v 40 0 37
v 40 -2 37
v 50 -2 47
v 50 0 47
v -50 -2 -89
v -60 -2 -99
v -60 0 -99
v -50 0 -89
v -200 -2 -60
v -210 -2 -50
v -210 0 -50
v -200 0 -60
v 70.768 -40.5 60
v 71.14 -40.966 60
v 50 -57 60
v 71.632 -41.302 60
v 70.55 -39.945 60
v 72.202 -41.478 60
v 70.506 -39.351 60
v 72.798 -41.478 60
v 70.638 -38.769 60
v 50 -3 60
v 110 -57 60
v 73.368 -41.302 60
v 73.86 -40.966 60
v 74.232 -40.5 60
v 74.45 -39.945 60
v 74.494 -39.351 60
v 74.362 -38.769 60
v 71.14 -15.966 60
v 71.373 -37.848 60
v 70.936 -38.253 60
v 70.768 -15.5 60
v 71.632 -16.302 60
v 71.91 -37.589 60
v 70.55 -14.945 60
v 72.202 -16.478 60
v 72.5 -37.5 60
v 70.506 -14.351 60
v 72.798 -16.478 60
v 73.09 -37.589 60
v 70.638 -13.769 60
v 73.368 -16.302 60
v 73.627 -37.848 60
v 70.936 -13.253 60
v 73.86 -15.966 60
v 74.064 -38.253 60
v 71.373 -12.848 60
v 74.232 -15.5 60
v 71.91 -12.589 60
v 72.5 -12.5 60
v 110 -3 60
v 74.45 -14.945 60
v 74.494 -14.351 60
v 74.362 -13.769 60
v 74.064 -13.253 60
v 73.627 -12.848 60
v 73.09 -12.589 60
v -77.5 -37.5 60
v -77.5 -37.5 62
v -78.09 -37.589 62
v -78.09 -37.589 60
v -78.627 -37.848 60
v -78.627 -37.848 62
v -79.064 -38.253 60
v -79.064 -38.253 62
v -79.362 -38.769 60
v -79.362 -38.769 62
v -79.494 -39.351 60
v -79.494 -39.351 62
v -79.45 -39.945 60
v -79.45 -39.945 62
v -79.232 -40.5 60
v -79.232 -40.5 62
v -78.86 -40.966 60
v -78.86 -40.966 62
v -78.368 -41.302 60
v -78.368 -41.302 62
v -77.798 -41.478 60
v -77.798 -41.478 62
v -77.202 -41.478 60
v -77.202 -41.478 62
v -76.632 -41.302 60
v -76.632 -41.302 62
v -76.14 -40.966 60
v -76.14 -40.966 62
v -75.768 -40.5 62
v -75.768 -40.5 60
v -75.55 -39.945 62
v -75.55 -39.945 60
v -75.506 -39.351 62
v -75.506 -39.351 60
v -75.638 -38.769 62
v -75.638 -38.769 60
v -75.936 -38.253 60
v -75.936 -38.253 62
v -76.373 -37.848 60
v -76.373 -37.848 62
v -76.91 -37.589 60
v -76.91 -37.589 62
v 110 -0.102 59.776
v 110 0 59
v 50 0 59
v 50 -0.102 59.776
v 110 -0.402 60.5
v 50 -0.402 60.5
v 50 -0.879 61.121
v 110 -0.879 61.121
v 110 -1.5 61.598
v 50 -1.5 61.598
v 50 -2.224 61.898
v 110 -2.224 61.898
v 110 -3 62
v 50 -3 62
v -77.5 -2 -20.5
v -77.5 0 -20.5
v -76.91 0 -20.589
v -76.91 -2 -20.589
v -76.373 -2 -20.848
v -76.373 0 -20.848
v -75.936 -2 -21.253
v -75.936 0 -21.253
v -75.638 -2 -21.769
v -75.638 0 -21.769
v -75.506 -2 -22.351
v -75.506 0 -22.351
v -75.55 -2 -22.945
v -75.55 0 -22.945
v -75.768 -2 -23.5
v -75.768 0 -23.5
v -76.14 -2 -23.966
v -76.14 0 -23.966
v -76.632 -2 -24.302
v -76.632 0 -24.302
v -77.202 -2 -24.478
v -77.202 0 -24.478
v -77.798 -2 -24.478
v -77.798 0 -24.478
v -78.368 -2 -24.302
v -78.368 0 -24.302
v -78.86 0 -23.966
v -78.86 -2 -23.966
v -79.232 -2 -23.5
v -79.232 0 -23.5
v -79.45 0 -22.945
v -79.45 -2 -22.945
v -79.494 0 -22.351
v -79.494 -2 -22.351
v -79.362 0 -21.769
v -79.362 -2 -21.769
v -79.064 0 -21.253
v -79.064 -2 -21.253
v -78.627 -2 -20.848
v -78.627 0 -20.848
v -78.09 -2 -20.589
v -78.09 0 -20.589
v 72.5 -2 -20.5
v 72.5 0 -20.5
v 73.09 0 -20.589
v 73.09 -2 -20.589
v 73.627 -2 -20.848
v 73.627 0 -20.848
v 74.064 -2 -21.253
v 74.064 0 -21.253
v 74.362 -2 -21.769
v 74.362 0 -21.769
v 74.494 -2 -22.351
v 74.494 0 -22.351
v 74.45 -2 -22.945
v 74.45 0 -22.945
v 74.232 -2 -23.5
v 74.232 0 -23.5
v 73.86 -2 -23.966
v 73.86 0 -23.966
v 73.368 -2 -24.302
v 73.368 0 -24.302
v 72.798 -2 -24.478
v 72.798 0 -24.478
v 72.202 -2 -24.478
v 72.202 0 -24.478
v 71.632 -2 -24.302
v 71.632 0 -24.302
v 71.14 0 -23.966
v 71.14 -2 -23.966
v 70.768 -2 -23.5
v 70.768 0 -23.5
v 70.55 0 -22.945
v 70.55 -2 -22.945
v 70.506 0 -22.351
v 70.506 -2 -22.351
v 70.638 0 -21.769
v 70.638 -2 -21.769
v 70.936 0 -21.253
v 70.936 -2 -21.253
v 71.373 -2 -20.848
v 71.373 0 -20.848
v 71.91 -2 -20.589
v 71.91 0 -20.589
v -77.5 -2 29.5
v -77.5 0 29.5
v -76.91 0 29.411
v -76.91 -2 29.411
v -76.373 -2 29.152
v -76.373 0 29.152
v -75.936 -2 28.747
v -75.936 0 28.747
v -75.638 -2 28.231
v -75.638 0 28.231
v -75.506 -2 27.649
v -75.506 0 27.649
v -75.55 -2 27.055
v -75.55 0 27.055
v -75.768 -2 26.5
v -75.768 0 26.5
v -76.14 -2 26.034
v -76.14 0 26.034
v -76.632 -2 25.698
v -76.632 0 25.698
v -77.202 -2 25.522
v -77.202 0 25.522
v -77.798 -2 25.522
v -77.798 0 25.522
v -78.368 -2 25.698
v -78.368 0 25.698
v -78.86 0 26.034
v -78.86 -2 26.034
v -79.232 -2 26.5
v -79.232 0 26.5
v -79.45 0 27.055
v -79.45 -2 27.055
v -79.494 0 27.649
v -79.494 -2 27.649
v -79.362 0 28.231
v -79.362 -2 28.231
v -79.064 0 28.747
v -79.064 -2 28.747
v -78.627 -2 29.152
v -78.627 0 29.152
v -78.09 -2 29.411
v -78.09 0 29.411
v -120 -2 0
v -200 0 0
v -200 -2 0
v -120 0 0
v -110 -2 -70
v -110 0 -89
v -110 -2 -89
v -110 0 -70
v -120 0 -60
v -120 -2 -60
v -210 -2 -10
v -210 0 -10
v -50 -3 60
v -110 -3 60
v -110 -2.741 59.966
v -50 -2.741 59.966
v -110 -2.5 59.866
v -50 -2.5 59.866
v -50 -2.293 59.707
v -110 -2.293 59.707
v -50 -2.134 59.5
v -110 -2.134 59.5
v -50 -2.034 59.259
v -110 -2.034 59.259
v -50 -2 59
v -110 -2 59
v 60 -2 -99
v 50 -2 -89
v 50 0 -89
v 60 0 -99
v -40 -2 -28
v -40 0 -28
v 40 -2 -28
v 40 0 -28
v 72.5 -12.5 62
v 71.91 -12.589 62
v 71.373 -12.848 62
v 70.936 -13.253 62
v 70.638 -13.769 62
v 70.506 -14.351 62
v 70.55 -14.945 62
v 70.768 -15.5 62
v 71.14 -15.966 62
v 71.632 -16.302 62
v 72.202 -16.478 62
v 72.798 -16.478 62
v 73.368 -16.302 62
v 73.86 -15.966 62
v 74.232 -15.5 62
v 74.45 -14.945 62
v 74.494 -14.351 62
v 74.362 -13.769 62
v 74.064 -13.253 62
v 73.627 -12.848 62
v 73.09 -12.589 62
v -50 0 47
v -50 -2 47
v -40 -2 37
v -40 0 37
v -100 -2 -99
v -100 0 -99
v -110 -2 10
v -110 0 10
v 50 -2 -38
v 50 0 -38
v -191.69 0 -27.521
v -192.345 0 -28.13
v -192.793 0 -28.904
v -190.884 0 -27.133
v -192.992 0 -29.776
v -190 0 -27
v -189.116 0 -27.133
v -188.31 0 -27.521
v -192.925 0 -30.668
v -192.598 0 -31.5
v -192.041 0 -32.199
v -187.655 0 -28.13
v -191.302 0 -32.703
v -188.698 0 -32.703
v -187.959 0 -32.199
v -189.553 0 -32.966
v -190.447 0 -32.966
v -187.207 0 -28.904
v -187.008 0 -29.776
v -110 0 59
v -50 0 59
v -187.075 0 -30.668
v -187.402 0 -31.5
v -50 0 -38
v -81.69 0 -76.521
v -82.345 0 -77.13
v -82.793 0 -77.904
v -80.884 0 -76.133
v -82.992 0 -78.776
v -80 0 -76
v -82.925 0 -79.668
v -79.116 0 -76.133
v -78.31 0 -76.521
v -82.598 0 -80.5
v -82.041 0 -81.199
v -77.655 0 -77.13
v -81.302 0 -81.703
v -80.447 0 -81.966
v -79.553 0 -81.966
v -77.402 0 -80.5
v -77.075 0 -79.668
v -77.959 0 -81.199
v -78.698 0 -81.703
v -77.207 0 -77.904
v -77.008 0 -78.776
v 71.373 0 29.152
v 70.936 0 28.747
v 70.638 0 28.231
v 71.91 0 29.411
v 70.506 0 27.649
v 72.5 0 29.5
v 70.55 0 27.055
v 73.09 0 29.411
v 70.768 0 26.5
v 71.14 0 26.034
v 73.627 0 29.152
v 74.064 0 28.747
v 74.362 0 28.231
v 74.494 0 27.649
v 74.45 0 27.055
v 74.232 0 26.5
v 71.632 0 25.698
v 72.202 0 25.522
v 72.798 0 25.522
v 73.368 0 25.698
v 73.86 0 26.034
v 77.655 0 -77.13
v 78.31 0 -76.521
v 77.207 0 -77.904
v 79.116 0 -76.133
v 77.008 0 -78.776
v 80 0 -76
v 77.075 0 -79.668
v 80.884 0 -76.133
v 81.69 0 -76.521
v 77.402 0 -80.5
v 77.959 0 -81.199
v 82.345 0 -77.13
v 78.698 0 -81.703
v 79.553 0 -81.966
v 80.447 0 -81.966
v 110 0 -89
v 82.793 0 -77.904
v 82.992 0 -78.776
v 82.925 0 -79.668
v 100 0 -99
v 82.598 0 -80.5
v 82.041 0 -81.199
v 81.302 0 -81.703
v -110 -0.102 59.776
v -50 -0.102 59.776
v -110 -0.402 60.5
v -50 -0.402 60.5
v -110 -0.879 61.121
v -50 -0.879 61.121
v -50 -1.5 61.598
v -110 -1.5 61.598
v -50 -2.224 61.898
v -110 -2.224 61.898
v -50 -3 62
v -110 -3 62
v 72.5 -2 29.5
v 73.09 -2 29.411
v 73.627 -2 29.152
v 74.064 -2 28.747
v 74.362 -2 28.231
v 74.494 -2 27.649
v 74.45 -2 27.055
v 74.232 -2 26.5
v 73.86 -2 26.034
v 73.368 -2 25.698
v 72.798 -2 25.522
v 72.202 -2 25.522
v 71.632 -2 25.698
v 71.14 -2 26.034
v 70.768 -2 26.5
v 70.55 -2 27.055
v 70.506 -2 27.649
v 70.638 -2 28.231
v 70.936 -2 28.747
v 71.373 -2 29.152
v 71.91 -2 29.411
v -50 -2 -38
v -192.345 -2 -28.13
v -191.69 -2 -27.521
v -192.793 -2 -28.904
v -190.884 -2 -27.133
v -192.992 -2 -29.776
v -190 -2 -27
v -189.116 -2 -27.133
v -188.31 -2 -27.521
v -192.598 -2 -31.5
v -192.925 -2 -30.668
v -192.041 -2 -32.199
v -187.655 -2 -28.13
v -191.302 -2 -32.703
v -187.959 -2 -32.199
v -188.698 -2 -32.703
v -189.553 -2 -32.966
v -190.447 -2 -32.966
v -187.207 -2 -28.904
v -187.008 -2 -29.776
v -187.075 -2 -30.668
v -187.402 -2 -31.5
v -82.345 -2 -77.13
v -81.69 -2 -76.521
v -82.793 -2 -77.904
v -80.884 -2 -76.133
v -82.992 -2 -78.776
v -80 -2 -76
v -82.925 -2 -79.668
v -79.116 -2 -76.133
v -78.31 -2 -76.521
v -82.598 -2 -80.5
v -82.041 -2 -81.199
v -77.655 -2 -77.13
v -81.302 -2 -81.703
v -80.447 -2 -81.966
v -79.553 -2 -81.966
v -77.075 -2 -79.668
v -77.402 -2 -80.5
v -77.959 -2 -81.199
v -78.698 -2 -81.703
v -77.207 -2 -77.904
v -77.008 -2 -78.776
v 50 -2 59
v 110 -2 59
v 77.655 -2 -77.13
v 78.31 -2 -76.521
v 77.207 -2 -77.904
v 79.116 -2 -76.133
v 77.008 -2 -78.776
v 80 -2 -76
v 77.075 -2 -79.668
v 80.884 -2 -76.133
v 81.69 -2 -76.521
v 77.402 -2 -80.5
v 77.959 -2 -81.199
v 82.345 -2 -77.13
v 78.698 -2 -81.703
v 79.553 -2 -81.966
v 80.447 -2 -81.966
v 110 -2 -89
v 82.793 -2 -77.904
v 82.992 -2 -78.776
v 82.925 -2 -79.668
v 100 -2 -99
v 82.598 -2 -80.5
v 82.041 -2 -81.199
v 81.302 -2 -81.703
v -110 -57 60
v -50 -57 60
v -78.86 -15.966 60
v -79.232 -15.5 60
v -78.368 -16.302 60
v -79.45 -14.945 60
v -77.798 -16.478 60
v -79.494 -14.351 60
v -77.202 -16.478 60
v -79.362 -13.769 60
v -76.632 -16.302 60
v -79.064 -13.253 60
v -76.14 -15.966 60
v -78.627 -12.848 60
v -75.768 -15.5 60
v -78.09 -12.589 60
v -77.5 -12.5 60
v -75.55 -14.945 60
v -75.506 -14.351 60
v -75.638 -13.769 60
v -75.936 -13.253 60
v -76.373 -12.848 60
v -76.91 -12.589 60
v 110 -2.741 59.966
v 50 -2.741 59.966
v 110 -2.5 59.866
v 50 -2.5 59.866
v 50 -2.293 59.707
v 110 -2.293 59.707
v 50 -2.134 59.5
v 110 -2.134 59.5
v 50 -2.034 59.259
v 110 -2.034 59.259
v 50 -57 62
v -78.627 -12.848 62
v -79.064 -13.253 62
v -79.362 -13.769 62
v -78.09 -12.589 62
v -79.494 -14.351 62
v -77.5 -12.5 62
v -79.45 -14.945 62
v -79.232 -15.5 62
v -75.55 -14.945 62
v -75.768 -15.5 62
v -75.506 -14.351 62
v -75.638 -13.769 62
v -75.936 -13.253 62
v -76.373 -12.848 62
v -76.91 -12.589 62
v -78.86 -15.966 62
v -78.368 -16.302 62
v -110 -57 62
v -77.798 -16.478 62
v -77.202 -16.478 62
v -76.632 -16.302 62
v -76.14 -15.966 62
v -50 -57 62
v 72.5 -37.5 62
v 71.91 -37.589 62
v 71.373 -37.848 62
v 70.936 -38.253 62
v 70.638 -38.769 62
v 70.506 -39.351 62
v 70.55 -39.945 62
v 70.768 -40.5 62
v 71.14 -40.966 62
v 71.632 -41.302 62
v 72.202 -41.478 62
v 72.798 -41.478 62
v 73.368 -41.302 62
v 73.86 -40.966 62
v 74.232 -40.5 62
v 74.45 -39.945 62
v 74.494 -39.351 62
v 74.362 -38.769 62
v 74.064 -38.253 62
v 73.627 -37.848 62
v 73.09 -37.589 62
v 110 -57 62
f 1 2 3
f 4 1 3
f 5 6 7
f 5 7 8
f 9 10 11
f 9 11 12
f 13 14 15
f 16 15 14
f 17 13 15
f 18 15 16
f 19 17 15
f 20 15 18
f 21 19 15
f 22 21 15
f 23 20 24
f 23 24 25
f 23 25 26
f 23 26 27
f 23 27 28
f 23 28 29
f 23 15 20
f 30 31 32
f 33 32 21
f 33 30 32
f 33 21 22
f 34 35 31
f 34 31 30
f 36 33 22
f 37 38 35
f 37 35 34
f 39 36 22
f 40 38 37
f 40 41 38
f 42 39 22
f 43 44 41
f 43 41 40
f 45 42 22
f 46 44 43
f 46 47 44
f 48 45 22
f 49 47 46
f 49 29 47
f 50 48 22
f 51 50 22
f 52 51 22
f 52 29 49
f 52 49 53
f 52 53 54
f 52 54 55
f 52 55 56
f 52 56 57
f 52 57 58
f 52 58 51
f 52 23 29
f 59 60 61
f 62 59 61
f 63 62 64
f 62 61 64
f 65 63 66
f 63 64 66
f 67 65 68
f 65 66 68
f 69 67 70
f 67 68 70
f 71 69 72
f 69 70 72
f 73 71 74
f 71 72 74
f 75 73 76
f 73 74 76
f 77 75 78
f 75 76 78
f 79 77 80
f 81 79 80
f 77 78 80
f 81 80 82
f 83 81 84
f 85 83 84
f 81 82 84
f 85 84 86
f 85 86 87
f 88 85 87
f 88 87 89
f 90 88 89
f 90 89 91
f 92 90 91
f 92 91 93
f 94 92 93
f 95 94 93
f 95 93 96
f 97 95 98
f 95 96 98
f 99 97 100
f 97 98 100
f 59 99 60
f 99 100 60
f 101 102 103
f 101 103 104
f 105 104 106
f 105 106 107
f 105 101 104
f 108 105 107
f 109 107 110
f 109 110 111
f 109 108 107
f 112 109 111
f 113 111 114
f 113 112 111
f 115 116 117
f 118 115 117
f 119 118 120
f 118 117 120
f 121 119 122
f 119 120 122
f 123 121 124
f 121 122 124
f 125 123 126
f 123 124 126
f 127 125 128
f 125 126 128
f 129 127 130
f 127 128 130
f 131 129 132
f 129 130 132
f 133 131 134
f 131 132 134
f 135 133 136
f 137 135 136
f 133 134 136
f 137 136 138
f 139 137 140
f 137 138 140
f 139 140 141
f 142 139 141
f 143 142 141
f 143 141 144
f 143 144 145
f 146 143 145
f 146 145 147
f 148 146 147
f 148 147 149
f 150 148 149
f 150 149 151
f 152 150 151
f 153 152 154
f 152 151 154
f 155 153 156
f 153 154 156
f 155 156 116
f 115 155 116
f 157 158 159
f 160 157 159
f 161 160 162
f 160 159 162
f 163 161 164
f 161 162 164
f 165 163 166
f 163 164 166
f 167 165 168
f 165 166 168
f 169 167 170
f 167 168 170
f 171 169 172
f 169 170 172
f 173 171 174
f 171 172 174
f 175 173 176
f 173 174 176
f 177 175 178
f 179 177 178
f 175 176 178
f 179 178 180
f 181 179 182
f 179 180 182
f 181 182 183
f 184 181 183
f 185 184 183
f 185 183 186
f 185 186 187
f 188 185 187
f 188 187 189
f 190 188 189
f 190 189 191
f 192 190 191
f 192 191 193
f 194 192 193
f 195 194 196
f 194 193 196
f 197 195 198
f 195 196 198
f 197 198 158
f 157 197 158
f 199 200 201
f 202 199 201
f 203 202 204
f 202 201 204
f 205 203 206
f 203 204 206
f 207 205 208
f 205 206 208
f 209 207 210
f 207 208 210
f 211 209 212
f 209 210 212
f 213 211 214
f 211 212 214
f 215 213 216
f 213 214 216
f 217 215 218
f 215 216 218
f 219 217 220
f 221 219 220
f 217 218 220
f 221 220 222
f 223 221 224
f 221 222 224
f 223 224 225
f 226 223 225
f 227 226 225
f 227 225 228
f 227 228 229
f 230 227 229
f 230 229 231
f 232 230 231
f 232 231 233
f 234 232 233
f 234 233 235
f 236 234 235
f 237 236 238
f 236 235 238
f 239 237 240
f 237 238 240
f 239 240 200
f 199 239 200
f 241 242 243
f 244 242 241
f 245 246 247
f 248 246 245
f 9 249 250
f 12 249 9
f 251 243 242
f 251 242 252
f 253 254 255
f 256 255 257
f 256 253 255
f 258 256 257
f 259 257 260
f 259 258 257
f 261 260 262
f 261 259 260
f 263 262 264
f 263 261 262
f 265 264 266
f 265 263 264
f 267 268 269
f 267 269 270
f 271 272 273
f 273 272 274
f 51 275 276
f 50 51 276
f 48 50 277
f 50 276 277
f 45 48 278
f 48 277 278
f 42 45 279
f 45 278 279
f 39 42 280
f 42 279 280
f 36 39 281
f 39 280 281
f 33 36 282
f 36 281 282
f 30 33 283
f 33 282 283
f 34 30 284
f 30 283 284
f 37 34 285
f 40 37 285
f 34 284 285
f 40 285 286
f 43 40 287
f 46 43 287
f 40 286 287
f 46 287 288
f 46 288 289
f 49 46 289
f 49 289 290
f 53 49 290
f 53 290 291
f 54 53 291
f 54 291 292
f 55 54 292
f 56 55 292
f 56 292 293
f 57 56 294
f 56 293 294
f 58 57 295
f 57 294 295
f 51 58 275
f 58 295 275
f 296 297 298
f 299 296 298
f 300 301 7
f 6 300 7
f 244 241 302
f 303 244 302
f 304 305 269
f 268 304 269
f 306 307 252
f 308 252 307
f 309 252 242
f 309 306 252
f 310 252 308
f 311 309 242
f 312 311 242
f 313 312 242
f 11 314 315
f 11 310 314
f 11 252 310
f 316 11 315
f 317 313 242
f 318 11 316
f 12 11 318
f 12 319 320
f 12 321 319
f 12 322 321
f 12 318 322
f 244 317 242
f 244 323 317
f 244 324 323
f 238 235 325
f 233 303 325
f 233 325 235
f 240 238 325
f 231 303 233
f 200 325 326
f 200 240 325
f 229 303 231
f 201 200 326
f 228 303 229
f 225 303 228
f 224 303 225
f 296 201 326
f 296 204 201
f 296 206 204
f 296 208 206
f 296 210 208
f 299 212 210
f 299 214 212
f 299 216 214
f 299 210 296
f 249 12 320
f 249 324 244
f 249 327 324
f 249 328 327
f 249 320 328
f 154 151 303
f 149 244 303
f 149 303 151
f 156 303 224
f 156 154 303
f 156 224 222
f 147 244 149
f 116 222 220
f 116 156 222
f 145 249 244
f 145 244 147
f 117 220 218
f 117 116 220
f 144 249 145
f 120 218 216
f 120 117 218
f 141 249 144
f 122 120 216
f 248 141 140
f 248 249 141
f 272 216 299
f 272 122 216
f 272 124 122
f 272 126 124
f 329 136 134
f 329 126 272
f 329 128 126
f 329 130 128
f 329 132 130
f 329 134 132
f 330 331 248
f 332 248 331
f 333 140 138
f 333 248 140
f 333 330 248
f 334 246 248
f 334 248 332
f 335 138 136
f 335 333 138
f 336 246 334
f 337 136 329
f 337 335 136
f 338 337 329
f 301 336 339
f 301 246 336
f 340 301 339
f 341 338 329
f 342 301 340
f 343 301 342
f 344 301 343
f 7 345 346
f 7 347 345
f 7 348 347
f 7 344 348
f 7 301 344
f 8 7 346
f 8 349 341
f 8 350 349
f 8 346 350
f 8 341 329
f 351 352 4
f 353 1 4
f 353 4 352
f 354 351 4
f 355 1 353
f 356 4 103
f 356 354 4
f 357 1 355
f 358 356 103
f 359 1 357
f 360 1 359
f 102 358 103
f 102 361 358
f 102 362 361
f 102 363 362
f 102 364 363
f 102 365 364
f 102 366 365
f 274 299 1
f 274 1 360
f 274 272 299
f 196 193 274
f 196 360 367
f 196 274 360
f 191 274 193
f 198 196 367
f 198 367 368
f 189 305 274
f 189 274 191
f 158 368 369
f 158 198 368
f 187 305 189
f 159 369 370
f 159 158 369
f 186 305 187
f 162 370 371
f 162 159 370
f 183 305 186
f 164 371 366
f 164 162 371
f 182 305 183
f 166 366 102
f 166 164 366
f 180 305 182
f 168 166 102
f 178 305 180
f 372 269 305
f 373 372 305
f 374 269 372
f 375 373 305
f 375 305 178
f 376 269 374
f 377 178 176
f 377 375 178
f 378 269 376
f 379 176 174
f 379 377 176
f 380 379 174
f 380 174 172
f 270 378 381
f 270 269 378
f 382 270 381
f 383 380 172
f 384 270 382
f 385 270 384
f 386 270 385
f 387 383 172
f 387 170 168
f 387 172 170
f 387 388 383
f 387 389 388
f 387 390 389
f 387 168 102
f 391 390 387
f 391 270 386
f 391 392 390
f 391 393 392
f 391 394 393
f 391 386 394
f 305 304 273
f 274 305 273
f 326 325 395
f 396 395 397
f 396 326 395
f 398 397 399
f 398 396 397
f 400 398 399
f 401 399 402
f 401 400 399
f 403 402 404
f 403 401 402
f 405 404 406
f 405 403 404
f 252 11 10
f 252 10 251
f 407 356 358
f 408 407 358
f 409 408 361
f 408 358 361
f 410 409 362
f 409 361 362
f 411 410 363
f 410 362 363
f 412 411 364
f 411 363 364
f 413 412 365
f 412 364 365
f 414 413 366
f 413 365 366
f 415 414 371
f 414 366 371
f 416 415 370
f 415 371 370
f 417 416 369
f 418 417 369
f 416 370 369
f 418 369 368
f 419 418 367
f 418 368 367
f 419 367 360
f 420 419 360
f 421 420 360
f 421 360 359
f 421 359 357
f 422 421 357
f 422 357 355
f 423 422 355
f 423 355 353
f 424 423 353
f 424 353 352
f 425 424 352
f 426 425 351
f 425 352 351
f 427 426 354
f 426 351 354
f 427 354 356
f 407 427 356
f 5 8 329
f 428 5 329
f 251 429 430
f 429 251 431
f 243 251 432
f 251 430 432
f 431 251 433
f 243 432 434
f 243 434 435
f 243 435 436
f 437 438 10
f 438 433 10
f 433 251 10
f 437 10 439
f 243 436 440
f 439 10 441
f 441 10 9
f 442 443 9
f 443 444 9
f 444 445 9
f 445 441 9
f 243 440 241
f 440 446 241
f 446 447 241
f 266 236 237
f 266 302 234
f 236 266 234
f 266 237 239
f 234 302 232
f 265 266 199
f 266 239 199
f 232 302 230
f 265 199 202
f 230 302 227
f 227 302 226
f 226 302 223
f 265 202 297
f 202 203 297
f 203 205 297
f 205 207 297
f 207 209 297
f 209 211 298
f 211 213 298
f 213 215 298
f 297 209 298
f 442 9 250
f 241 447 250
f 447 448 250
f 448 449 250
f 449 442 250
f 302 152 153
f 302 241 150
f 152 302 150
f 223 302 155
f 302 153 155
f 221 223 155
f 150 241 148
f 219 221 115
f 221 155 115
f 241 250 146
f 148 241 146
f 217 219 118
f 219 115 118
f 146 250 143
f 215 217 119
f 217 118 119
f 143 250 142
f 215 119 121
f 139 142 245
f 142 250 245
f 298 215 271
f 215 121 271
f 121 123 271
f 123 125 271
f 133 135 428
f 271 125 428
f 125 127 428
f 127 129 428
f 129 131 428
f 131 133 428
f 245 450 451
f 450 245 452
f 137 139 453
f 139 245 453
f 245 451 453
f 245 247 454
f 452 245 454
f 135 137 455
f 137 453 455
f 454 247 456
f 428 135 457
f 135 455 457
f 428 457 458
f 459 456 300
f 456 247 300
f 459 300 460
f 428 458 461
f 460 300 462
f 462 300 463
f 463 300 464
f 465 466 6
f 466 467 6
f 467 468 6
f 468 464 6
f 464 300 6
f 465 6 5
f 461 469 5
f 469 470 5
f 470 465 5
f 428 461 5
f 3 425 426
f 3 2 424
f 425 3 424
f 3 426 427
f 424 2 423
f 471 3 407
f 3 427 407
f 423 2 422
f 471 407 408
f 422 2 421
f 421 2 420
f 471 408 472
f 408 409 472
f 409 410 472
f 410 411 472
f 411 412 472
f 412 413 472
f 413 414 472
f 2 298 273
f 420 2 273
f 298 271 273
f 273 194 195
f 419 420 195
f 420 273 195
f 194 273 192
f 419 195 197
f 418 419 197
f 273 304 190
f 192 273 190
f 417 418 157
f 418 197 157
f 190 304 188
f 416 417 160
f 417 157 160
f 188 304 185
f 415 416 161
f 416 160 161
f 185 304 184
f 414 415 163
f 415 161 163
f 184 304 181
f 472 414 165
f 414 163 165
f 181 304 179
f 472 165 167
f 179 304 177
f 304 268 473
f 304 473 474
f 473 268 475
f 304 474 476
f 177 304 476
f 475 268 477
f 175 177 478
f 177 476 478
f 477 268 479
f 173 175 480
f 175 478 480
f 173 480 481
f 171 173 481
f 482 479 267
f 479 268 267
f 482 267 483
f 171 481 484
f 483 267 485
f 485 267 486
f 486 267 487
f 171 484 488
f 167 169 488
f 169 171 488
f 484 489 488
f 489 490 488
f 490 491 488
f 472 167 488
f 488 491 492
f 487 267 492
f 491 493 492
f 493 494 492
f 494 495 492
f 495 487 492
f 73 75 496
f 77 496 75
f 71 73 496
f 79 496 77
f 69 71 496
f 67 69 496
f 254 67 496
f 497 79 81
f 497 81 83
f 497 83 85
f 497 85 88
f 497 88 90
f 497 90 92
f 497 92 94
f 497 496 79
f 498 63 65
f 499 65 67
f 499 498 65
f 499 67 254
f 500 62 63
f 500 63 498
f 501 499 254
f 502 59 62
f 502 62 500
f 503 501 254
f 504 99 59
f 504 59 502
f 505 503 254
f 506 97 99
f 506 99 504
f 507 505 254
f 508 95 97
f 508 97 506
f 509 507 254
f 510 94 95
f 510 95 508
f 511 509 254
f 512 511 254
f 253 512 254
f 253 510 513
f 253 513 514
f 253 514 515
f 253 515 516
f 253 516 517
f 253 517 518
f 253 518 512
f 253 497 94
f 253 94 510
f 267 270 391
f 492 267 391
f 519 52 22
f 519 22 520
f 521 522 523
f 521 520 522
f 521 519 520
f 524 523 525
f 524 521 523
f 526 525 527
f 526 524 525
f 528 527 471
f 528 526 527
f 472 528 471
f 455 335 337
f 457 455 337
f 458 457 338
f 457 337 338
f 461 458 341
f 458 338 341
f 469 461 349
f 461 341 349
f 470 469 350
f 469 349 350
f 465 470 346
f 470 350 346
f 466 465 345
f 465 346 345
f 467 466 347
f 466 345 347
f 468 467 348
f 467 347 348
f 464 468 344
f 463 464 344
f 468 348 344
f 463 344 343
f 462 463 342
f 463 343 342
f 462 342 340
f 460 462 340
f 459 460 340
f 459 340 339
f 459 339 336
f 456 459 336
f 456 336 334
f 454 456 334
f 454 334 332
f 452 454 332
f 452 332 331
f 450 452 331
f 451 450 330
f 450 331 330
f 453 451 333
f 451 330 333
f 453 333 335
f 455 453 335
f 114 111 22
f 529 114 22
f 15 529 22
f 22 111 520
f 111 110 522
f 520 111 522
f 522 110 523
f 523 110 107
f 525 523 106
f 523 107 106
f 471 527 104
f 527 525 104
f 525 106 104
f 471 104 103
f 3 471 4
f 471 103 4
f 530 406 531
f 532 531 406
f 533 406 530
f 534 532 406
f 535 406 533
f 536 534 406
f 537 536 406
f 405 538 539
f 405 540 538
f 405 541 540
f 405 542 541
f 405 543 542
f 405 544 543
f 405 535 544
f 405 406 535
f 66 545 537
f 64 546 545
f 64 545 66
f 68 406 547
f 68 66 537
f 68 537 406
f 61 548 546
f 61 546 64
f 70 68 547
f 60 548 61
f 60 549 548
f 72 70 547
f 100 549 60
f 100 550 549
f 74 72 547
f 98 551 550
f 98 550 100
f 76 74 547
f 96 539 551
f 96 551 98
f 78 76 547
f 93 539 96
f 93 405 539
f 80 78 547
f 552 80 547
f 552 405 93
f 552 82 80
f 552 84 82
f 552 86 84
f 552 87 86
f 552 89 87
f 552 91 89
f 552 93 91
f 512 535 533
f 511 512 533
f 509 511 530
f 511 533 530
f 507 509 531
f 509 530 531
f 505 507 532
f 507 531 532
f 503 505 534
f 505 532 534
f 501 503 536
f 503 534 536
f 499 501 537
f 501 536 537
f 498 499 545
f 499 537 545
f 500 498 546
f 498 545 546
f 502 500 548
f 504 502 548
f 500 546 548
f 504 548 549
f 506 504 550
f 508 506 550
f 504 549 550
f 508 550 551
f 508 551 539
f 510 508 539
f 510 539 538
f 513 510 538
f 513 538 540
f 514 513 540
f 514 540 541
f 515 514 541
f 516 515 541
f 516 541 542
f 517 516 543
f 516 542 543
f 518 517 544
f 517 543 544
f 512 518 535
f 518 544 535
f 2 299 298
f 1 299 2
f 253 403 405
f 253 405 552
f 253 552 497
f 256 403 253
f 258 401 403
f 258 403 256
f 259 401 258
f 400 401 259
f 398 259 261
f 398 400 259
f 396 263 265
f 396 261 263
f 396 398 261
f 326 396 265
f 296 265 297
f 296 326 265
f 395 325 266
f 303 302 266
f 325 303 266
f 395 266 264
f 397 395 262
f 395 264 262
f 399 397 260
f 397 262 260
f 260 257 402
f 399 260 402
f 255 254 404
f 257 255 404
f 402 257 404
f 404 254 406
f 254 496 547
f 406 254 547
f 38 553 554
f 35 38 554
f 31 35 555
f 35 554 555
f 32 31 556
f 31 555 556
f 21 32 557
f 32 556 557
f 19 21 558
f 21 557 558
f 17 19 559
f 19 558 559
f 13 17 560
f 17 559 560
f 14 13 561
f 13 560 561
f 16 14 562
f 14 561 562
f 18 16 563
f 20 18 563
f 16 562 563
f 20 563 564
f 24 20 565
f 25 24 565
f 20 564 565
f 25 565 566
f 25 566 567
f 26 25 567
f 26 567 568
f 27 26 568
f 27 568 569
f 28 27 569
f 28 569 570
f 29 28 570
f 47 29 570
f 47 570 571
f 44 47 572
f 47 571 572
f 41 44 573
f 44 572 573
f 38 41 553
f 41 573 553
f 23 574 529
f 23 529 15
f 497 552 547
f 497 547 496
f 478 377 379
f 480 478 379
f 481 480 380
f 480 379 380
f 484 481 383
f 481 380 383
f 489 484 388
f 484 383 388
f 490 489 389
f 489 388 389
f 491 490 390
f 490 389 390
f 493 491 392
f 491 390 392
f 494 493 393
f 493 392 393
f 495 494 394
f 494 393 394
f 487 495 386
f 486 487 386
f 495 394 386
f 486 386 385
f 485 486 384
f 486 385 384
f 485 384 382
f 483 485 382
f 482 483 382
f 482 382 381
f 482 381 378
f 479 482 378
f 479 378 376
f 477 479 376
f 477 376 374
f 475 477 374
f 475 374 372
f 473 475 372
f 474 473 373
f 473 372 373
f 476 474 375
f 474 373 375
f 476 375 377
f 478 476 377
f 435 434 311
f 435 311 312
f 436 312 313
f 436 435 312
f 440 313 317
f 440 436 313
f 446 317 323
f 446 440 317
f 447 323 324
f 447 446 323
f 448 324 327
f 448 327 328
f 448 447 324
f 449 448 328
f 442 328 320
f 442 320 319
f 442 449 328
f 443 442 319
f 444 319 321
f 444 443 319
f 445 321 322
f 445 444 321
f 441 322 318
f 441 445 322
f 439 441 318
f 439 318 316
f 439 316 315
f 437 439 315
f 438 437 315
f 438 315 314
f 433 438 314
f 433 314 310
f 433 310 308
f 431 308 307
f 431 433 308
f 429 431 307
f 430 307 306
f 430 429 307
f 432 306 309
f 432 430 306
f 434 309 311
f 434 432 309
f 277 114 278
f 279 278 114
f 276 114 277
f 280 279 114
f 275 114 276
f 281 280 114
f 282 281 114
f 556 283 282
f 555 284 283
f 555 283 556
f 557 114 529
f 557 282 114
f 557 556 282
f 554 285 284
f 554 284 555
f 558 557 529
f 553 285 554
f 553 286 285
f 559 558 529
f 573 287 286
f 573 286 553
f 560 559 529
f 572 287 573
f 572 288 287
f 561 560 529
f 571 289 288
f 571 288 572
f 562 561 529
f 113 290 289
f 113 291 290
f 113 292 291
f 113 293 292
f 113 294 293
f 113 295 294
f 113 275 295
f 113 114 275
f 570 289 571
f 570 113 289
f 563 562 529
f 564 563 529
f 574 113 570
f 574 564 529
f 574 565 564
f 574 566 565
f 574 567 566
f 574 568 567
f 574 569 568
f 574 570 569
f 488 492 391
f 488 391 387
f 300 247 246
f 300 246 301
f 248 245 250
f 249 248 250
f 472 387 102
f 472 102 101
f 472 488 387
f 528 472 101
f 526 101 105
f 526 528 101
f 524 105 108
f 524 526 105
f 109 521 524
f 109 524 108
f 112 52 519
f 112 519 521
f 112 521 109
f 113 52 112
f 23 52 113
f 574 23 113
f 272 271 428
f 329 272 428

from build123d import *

# Parameters (mm, degrees)
SM_BASE_FLANGE_1_DEPTH            = 2
SM_EDGE_FLANGE_2_STRIP_W          = 10
SM_EDGE_FLANGE_2_STRIP_H          = 2
SM_EDGE_FLANGE_2_STRIP_CUT_DEPTH  = 220
SM_EDGE_FLANGE_2_RELIEF_W         = 11
SM_EDGE_FLANGE_2_RELIEF_H         = 1
SM_EDGE_FLANGE_2_RELIEF_CUT_DEPTH = 2
SM_EDGE_FLANGE_2_DEPTH            = 220
CUT_EXTRUDE_START                 = 62
SKETCH_12_R                       = 2
CUT_EXTRUDE_4_DEPTH               = 2
SKETCH_14_R                       = 2
CUT_EXTRUDE_2_DEPTH               = 2
SKETCH_15_W                       = 100
SKETCH_15_H                       = 25
CUT_EXTRUDE_3_DEPTH               = 57
SKETCH_16_W                       = 100
SKETCH_16_H                       = 60
CUT_EXTRUDE_6_DEPTH               = 2
CUT_EXTRUDE_START_2               = -2
SKETCH_18_R                       = 3
CUT_EXTRUDE_7_DEPTH               = 2
OTHER_START                       = -2
OTHER_2_DEPTH                     = 2
SKETCH_20_W                       = 60
SKETCH_20_H                       = 61
CUT_EXTRUDE_8_DEPTH               = 2
SKETCH_21_R                       = 3
CUT_EXTRUDE_9_DEPTH               = 2
OTHER_4_DEPTH                     = 2
OTHER_4_2_DEPTH                   = 2


# Read off the part's stored shape, not the designer's step: 断开-边角2, 断开-边角4
# Sheet-metal steps are written as plain solids
with BuildPart() as part:
    # Sketch 1 → 基体-法兰1 (new body)
    with BuildSketch(Plane(origin=(0, 0, 0), x_dir=(1, 0, 0), z_dir=(0, 1, 0))):
        Polygon((-110, -60), (110, -60), (110, 60), (110, 160), (-110, 160), (-110, 60), (-210, 60), (-210, -60), align=None)
    extrude(amount=-SM_BASE_FLANGE_1_DEPTH)

    # 边线-法兰2 strip (across the edge) → 边线-法兰2 strip cut (cut)
    with BuildSketch(Plane(origin=(110, -2, 60), x_dir=(0, 0, -1), z_dir=(-1, 0, 0))):
        with Locations((-4, -1)):
            Rectangle(SM_EDGE_FLANGE_2_STRIP_W, SM_EDGE_FLANGE_2_STRIP_H)
    extrude(amount=SM_EDGE_FLANGE_2_STRIP_CUT_DEPTH, mode=Mode.SUBTRACT)

    # 边线-法兰2 relief (on the sheet) → 边线-法兰2 relief cut (cut)
    with BuildSketch(Plane(origin=(110, -2, 59), x_dir=(0, 0, -1), z_dir=(0, -1, 0))):
        with Locations((-4.5, -220.5)):
            Rectangle(SM_EDGE_FLANGE_2_RELIEF_W, SM_EDGE_FLANGE_2_RELIEF_H)
    extrude(amount=-SM_EDGE_FLANGE_2_RELIEF_CUT_DEPTH, mode=Mode.SUBTRACT)

    # 边线-法兰2 section (across the edge) → 边线-法兰2 (add)
    with BuildSketch(Plane(origin=(110, -2, 60), x_dir=(0, 0, -1), z_dir=(-1, 0, 0))):
        with BuildLine():
            Line((-2, 1), (-2, 55))
            Line((-2, 55), (0, 55))
            Line((0, 55), (0, 1))
            ThreePointArc((0, 1), (0.292893219, 0.292893219), (1, 0))
            Line((1, 0), (1, -2))
            ThreePointArc((1, -2), (-1.121320344, -1.121320344), (-2, 1))
        make_face()
    extrude(amount=SM_EDGE_FLANGE_2_DEPTH)

    # 草图12 → 切除-拉伸4 (cut)
    with BuildSketch(Plane.XY.offset(CUT_EXTRUDE_START)):
        with Locations(Location((72.5, -14.5, 0), (0, 0, 90))):
            Circle(SKETCH_12_R)
        with Locations(Location((-77.5, -14.5, 0), (0, 0, 90))):
            Circle(SKETCH_12_R)
        with Locations(Location((-77.5, -39.5, 0), (0, 0, 90))):
            Circle(SKETCH_12_R)
        with Locations(Location((72.5, -39.5, 0), (0, 0, 90))):
            Circle(SKETCH_12_R)
    extrude(amount=-CUT_EXTRUDE_4_DEPTH, mode=Mode.SUBTRACT)

    # 草图14 → 切除-拉伸2 (cut)
    with BuildSketch(Plane(origin=(0, 0, 0), x_dir=(1, 0, 0), z_dir=(0, 1, 0))):
        with Locations(Location((-77.5, 22.5, 0), (0, 0, 270))):
            Circle(SKETCH_14_R)
        with Locations(Location((-77.5, -27.5, 0), (0, 0, 270))):
            Circle(SKETCH_14_R)
        with Locations(Location((72.5, 22.5, 0), (0, 0, 270))):
            Circle(SKETCH_14_R)
        with Locations(Location((72.5, -27.5, 0), (0, 0, 270))):
            Circle(SKETCH_14_R)
    extrude(amount=-CUT_EXTRUDE_2_DEPTH, mode=Mode.SUBTRACT)

    # 草图15 → 切除-拉伸3 (cut)
    with BuildSketch(Plane(origin=(0, 0, 0), x_dir=(1, 0, 0), z_dir=(0, 1, 0))):
        with Locations((0, -49.5)):
            Rectangle(SKETCH_15_W, SKETCH_15_H)
        Polygon((-50, 53), (-50, 28), (50, 28), (50, 53), (50, 160), (-50, 160), align=None)
    extrude(amount=-CUT_EXTRUDE_3_DEPTH, mode=Mode.SUBTRACT)

    # 草图16 → 切除-拉伸6 (cut)
    with BuildSketch(Plane(origin=(0, 0, 0), x_dir=(1, 0, 0), z_dir=(0, 1, 0))):
        with Locations((-160, -30)):
            Rectangle(SKETCH_16_W, SKETCH_16_H)
    extrude(amount=-CUT_EXTRUDE_6_DEPTH, mode=Mode.SUBTRACT)

    # 草图18 → 切除-拉伸7 (cut)
    with BuildSketch(Plane(origin=(0, 0, 0), x_dir=(1, 0, 0), z_dir=(0, 1, 0)).offset(CUT_EXTRUDE_START_2)):
        with Locations(Location((-80, 140, 0), (0, 0, 270))):
            Circle(SKETCH_18_R)
        with Locations(Location((80, 140, 0), (0, 0, 270))):
            Circle(SKETCH_18_R)
        with Locations(Location((-190, 30, 0), (0, 0, 270))):
            Circle(SKETCH_18_R)
    extrude(amount=CUT_EXTRUDE_7_DEPTH, mode=Mode.SUBTRACT)

    # Other 2 outline → Other 2 (add)
    with BuildSketch(Plane(origin=(0, 0, 0), x_dir=(1, 0, 0), z_dir=(0, 1, 0)).offset(OTHER_START)):
        Polygon((-50, -37), (-50, -47), (-40, -37), align=None)
        Polygon((50, -37), (40, -37), (50, -47), align=None)
        Polygon((50, 28), (50, 38), (40, 28), align=None)
        Polygon((-50, 28), (-40, 28), (-50, 38), align=None)
    extrude(amount=OTHER_2_DEPTH)

    # 草图20 → 切除-拉伸8 (cut)
    with BuildSketch(Plane(origin=(0, 0, 0), x_dir=(1, 0, 0), z_dir=(0, 1, 0))):
        with Locations((-80, 129.5)):
            Rectangle(SKETCH_20_W, SKETCH_20_H)
        with Locations((80, 129.5)):
            Rectangle(SKETCH_20_W, SKETCH_20_H)
    extrude(amount=-CUT_EXTRUDE_8_DEPTH, mode=Mode.SUBTRACT)

    # 草图21 → 切除-拉伸9 (cut)
    with BuildSketch(Plane(origin=(0, 0, 0), x_dir=(1, 0, 0), z_dir=(0, 1, 0))):
        with Locations(Location((-80, 79, 0), (0, 0, 270))):
            Circle(SKETCH_21_R)
        with Locations(Location((80, 79, 0), (0, 0, 270))):
            Circle(SKETCH_21_R)
    extrude(amount=-CUT_EXTRUDE_9_DEPTH, mode=Mode.SUBTRACT)

    # Other 4 outline → Other 4 (cut)
    with BuildSketch(Plane(origin=(0, 0, 0), x_dir=(1, 0, 0), z_dir=(0, 1, 0)).offset(OTHER_START)):
        Polygon((-50, 99), (-60, 99), (-50, 89), align=None)
        Polygon((-200, 0), (-210, 10), (-210, 0), align=None)
        Polygon((-210, 50), (-200, 60), (-210, 60), align=None)
        Polygon((-110, 89), (-100, 99), (-110, 99), align=None)
        Polygon((50, 99), (50, 89), (60, 99), align=None)
        Polygon((110, 99), (100, 99), (110, 89), align=None)
    extrude(amount=OTHER_4_DEPTH, mode=Mode.SUBTRACT)

    # Other 4 2 outline → Other 4 2 (add)
    with BuildSketch(Plane(origin=(0, 0, 0), x_dir=(1, 0, 0), z_dir=(0, 1, 0)).offset(OTHER_START)):
        Polygon((-110, 0), (-120, 0), (-110, -10), align=None)
        Polygon((-110, 60), (-110, 70), (-120, 60), align=None)
    extrude(amount=OTHER_4_2_DEPTH)


solid = part.part
